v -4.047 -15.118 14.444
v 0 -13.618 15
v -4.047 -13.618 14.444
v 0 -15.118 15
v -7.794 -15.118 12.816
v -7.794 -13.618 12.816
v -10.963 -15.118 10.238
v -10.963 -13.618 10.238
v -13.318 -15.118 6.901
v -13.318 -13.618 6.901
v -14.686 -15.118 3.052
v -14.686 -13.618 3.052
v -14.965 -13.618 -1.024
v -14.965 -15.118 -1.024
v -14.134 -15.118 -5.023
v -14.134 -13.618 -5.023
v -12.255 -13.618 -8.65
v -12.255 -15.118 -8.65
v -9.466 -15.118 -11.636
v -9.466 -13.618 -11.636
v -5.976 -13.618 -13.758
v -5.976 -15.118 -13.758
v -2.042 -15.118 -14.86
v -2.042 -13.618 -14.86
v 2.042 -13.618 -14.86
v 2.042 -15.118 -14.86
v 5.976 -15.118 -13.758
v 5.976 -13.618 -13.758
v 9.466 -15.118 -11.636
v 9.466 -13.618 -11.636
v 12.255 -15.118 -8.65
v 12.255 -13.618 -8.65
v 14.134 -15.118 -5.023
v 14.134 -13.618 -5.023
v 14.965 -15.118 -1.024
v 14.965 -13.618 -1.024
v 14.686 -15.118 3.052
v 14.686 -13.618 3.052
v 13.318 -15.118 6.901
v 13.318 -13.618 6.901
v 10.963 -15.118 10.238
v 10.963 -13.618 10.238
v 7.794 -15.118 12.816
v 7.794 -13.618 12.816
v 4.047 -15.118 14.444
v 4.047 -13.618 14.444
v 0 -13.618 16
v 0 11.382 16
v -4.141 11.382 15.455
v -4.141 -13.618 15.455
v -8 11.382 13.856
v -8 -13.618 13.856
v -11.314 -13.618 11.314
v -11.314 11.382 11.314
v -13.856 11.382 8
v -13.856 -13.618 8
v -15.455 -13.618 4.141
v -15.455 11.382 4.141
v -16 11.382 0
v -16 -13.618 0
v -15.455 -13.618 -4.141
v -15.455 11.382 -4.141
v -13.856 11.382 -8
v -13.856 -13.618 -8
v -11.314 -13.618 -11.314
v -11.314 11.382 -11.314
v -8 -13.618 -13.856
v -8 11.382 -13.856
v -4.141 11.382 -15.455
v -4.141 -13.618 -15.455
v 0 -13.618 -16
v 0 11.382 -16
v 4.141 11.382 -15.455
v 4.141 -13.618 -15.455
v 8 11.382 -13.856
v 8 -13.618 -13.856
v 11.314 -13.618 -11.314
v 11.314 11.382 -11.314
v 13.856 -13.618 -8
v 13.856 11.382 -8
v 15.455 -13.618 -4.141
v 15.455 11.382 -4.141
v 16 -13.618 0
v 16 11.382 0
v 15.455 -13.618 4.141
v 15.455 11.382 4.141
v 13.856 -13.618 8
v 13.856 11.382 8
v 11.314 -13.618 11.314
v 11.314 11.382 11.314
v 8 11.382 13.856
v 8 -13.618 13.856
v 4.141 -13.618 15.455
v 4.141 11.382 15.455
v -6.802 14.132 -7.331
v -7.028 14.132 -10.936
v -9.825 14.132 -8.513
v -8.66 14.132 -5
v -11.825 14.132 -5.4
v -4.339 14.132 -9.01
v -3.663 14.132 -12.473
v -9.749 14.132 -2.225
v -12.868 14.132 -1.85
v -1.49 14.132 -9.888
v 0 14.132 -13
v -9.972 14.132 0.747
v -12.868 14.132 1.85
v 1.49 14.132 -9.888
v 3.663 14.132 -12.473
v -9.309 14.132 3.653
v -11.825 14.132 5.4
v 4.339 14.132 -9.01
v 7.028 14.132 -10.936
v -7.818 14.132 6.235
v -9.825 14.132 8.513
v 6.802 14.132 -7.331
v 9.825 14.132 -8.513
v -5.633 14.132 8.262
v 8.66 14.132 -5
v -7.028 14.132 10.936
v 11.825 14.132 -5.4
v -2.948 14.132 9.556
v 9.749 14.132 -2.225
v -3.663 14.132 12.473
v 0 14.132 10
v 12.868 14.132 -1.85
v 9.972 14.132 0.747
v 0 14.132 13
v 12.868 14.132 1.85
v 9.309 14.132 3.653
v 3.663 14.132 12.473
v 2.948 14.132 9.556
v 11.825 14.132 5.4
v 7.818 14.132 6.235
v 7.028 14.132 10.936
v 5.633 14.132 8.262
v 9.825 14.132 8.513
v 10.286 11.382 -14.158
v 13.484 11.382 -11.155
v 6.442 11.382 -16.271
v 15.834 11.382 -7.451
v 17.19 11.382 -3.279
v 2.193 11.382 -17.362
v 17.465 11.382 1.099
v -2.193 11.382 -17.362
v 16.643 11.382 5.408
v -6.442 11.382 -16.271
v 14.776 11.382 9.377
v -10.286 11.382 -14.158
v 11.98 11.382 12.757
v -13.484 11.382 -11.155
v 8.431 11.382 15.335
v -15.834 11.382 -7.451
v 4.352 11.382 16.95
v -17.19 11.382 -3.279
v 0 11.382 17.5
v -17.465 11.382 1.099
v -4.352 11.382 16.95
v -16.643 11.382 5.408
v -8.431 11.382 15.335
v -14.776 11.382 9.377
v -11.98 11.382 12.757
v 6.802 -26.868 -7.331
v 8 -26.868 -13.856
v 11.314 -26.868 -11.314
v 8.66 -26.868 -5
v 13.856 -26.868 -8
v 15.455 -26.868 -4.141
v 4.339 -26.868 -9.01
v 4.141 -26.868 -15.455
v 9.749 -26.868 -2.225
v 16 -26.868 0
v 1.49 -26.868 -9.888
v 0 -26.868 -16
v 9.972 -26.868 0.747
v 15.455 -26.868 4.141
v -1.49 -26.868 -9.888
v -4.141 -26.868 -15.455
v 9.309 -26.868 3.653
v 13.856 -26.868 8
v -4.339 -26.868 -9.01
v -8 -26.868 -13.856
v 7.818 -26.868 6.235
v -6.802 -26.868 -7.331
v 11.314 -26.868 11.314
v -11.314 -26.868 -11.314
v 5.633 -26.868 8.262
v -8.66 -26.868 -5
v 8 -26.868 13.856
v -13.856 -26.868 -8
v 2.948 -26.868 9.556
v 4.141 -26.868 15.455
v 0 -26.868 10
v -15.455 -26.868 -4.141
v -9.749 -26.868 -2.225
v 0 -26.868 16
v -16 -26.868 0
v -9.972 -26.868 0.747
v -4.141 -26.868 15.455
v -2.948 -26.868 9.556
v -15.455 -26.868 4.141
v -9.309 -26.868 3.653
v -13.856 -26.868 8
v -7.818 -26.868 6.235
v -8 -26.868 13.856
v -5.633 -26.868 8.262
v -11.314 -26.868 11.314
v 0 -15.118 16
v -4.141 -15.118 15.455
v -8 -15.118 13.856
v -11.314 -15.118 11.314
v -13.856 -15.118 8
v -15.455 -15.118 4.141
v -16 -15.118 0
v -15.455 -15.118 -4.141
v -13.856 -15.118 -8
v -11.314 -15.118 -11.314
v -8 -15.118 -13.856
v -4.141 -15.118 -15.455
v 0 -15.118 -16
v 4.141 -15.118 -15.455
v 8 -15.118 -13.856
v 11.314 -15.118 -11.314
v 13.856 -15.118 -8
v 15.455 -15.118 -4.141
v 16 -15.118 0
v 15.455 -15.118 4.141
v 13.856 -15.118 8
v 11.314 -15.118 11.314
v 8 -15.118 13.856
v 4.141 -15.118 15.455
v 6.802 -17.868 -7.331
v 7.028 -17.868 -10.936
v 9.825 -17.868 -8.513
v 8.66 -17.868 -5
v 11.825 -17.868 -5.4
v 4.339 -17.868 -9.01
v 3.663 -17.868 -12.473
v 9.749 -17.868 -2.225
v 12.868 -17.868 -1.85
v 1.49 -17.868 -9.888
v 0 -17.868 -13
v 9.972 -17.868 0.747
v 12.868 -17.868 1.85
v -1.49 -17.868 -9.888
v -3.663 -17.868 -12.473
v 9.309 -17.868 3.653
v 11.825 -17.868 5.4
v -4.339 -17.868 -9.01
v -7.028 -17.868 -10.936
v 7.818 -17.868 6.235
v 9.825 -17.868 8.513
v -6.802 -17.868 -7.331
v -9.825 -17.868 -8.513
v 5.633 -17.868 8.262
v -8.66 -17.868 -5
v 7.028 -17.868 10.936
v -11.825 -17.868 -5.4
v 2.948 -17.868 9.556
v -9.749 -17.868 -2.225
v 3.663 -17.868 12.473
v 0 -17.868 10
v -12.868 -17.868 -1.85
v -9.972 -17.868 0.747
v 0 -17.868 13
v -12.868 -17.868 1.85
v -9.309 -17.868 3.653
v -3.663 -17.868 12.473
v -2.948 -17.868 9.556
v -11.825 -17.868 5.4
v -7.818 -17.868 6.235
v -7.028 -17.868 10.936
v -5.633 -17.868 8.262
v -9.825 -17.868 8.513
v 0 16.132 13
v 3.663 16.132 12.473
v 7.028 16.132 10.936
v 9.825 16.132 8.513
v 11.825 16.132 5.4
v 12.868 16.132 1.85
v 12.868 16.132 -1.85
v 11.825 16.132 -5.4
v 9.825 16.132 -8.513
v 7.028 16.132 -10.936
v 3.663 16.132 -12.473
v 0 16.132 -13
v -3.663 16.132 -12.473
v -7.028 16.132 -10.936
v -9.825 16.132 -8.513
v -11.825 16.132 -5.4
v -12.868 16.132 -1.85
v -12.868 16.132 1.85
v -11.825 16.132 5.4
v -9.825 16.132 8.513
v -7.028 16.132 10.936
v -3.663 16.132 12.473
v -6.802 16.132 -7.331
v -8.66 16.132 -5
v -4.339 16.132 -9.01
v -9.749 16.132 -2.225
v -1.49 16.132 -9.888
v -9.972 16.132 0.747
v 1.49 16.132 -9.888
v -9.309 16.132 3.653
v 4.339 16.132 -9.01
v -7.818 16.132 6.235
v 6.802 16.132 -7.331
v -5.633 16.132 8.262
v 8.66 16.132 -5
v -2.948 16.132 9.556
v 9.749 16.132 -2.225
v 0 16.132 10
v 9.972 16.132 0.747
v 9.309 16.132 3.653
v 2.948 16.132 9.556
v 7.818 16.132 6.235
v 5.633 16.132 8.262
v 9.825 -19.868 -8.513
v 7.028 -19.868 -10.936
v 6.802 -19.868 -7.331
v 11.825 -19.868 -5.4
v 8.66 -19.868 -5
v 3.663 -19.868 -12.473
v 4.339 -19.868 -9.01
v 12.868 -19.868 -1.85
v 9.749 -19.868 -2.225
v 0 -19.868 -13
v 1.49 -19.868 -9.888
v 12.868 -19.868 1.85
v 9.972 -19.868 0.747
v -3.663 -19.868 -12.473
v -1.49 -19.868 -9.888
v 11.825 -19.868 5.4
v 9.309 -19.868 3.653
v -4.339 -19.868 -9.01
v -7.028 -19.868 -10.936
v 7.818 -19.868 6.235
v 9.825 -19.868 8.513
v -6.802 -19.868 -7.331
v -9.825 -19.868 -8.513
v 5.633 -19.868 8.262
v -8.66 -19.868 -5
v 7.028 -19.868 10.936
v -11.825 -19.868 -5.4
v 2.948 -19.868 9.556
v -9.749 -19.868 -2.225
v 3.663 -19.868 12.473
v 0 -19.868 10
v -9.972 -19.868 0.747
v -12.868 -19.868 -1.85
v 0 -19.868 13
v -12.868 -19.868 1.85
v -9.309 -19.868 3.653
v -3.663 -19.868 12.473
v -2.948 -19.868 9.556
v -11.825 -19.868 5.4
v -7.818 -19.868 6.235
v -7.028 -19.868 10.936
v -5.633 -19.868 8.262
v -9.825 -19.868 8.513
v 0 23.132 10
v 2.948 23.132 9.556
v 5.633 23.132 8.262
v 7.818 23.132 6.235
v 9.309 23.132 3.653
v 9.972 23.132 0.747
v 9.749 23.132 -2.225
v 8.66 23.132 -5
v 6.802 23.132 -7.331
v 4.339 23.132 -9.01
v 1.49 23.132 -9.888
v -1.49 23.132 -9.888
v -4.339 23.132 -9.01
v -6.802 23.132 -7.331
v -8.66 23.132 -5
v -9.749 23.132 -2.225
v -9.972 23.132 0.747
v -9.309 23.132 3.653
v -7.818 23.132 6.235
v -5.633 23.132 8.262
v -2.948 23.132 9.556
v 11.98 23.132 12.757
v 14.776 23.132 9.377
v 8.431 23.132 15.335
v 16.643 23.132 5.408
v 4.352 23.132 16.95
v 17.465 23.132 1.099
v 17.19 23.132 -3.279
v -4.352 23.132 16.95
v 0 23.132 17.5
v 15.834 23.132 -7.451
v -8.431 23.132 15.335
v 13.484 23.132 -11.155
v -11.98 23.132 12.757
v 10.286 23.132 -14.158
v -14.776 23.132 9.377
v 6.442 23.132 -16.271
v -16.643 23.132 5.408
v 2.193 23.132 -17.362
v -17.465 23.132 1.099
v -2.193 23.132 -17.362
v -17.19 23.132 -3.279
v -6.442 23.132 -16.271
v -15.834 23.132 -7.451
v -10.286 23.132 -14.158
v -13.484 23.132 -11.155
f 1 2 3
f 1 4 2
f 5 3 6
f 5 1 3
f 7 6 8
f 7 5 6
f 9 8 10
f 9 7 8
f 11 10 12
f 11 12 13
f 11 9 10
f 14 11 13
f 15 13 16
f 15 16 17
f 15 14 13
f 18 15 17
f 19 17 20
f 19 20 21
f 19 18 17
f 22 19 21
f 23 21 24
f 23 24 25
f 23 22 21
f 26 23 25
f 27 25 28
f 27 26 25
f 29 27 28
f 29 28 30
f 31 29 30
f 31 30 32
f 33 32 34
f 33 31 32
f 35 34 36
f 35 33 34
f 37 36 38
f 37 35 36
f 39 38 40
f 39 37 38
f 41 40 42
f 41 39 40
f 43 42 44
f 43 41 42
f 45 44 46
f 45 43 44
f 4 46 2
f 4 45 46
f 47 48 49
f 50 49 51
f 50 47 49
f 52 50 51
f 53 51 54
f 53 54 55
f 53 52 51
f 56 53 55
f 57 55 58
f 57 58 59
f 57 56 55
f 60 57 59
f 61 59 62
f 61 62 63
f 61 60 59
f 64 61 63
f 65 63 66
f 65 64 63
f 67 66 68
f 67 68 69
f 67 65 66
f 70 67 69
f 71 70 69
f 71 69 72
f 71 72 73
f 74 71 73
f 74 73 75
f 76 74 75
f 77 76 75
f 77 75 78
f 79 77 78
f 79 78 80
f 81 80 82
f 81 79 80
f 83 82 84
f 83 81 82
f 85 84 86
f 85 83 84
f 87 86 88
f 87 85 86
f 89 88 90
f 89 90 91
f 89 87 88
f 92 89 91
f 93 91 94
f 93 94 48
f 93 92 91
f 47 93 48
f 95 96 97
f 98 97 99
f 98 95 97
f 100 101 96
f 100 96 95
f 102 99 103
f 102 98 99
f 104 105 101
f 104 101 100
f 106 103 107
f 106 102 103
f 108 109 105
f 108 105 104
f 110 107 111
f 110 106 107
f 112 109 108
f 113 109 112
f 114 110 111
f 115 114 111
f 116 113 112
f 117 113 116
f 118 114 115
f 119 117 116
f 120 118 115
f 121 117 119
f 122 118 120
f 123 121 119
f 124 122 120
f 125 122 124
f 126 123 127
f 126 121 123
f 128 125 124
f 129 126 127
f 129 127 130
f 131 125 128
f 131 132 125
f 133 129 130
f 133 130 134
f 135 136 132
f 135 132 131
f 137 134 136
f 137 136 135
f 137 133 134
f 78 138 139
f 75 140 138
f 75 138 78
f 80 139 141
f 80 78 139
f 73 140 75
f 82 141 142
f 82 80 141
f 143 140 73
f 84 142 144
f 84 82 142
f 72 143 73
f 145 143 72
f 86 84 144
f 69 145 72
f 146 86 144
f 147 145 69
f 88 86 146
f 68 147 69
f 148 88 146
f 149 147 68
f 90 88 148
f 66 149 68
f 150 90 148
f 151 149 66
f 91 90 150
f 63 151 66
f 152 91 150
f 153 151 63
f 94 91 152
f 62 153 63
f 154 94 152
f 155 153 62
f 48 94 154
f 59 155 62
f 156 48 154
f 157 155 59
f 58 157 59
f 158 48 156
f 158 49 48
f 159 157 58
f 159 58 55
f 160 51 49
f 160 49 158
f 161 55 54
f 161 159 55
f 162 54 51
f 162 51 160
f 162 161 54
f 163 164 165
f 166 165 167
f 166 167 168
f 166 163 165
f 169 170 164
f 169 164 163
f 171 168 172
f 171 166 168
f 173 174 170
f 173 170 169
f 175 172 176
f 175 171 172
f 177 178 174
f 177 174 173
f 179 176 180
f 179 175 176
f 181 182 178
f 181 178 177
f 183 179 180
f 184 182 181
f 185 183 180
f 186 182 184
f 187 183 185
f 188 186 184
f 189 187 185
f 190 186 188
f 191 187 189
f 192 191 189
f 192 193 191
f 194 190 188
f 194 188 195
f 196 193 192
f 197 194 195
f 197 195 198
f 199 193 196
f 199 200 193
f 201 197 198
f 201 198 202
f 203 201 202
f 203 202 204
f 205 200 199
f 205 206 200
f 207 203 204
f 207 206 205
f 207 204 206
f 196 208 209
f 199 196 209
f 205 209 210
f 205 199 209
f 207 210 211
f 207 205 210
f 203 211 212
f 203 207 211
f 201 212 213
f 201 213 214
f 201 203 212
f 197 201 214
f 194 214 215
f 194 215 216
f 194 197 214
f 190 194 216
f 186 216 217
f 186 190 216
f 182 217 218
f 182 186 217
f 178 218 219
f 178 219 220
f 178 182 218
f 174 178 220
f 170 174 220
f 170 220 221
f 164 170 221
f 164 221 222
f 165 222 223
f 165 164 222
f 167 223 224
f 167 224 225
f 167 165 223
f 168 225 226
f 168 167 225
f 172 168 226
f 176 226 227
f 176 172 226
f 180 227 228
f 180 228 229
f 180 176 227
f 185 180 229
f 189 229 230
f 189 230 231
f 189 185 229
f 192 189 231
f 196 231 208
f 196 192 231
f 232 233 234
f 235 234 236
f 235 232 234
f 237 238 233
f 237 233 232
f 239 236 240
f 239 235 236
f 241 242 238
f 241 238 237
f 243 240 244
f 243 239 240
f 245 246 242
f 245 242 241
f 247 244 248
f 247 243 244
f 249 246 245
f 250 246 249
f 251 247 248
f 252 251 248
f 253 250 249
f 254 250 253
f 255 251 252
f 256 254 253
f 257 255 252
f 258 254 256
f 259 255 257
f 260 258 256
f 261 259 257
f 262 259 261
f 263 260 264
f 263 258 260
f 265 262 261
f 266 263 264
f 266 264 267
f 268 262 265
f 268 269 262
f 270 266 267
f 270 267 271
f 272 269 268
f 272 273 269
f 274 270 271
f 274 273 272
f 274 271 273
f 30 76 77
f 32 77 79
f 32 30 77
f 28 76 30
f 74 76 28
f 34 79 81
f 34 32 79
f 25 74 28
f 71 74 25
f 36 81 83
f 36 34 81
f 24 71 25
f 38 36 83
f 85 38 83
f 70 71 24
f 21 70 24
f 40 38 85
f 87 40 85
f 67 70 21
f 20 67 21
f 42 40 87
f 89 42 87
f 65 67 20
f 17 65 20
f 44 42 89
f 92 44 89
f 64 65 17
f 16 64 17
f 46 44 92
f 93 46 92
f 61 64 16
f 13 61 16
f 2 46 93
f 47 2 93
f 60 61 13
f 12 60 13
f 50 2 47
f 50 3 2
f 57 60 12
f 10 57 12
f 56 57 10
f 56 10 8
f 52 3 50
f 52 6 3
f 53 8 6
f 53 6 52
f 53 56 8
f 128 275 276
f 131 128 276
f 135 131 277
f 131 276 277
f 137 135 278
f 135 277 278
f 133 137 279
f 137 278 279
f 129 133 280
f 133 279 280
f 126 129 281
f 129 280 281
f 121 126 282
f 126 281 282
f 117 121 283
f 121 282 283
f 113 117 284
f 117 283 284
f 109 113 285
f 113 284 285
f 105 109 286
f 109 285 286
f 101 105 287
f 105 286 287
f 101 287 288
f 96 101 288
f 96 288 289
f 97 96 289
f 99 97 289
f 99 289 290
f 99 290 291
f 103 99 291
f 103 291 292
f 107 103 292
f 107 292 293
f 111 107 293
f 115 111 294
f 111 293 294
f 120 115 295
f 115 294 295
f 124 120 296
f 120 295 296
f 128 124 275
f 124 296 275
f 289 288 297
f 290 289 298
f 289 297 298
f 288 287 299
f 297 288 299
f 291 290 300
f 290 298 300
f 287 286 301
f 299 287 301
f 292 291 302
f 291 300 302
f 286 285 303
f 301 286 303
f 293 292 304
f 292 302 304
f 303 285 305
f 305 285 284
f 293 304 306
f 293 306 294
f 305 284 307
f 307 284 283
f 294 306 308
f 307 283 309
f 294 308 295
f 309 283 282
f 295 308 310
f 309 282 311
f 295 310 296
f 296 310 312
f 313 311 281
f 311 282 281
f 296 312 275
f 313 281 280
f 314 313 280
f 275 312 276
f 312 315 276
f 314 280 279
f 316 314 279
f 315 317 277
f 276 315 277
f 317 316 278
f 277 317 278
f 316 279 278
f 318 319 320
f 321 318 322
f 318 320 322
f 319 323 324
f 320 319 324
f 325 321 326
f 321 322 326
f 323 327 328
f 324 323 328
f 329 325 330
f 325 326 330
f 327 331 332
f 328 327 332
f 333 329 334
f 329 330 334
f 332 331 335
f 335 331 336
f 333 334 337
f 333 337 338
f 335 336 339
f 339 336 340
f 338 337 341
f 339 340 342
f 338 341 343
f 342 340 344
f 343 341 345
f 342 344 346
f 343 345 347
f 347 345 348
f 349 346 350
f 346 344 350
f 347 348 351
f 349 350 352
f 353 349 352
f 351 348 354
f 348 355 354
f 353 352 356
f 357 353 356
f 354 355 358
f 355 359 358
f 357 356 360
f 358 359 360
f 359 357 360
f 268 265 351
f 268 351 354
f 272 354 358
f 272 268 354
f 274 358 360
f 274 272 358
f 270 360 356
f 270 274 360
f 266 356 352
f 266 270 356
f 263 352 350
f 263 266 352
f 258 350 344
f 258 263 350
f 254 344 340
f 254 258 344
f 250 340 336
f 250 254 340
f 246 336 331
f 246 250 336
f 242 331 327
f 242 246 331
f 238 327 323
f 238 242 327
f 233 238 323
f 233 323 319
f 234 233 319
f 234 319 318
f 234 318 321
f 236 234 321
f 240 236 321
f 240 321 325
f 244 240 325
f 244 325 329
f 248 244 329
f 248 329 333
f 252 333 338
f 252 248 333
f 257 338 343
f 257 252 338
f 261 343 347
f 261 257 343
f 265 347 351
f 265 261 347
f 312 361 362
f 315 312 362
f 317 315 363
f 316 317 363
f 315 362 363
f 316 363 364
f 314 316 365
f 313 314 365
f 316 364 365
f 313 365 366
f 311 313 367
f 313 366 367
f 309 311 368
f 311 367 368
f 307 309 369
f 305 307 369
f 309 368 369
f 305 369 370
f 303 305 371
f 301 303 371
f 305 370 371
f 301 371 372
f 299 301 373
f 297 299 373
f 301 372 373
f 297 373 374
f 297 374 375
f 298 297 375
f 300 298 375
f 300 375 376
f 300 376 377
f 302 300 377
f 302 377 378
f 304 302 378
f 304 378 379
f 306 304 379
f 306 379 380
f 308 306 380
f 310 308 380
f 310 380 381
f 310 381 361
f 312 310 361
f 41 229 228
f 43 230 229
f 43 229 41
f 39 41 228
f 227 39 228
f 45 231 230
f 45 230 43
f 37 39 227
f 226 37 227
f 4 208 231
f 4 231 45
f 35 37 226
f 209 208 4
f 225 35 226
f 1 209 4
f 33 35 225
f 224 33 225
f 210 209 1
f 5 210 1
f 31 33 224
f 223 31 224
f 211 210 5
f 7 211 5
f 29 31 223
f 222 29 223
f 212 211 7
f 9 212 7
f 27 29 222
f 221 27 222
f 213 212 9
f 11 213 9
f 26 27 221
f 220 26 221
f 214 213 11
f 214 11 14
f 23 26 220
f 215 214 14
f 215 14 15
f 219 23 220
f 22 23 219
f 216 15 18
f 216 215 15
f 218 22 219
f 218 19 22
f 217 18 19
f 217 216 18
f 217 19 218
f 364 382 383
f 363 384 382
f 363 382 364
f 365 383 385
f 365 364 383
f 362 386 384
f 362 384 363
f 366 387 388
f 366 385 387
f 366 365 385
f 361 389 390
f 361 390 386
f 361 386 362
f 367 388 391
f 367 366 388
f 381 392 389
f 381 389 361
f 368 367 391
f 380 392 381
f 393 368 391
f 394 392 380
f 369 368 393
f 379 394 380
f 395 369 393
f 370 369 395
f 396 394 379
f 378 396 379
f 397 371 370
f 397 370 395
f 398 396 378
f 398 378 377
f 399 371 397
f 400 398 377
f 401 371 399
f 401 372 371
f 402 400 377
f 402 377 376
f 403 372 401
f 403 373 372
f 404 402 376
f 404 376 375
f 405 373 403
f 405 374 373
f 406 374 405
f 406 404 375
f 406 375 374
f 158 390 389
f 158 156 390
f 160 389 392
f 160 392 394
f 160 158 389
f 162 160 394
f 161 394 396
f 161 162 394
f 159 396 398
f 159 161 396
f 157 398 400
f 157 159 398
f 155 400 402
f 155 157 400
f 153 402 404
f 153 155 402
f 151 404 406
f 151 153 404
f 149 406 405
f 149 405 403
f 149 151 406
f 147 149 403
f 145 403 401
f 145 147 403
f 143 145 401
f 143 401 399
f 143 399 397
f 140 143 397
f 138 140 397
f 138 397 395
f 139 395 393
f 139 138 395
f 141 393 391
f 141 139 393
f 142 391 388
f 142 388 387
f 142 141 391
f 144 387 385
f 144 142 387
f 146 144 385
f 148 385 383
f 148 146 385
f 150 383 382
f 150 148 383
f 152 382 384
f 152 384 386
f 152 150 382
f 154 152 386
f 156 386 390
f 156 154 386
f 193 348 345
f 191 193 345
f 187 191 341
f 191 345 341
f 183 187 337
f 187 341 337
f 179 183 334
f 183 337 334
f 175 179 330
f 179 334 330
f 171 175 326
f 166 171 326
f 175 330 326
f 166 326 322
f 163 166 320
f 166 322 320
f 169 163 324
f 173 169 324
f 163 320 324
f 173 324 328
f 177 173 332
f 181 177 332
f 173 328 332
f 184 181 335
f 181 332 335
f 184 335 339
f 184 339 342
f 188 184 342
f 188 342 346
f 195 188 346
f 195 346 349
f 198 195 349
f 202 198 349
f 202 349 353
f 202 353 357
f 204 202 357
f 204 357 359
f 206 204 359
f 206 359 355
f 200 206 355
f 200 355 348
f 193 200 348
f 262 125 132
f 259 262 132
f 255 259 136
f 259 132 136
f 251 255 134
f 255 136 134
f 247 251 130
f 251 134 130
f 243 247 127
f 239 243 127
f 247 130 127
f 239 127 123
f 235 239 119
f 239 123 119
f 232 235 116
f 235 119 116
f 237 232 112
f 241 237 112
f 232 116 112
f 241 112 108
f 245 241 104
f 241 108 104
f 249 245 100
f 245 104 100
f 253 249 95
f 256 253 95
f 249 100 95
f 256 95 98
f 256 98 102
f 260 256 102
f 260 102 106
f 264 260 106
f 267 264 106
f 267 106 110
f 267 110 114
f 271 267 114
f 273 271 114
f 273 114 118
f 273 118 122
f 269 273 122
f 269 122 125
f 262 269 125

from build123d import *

# Parameters (mm, degrees)
SKETCH2_R          = 10
CUT_EXTRUDE1_DEPTH = 56.789784011
SKETCH3_R          = 13
CUT_EXTRUDE2_DEPTH = 2
CUT_EXTRUDE3_START = -2
SKETCH4_R          = 13
CUT_EXTRUDE3_DEPTH = 2


with BuildPart() as part:
    # Sketch1 → Revolve1 (revolve)
    with BuildSketch(Plane.XY, mode=Mode.PRIVATE) as revolve1_sk:
        Polygon((0, 23.132117765), (17.5, 23.132117765), (17.5, 11.382117765), (16, 11.382117765), (16, -13.617882235), (15, -13.617882235), (15, -15.117882235), (16, -15.117882235), (16, -26.867882235), (0, -26.867882235), align=None)
    revolve(revolve1_sk.sketch.rotate(Axis((0, 23.362720403, 0), (0, -1, 0)), 90), axis=Axis((0, 23.362720403, 0), (0, -1, 0)))

    # Sketch2 → Cut-Extrude1 (cut, through all)
    with BuildSketch(Plane(origin=(0, 23.132117765, 0), x_dir=(1, 0, 0), z_dir=(0, 1, 0))):
        with Locations(Location((0, 0, 0), (0, 0, 270))):
            Circle(SKETCH2_R)
    extrude(amount=-CUT_EXTRUDE1_DEPTH, mode=Mode.SUBTRACT)

    # Sketch3 → Cut-Extrude2 (cut)
    with BuildSketch(Plane(origin=(0, 16.132117765, 0), x_dir=(1, 0, 0), z_dir=(0, 1, 0))):
        with Locations(Location((0, 0, 0), (0, 0, 270))):
            Circle(SKETCH3_R)
    extrude(amount=-CUT_EXTRUDE2_DEPTH, mode=Mode.SUBTRACT)

    # Sketch4 → Cut-Extrude3 (cut)
    with BuildSketch(Plane(origin=(0, -19.867882235, 0), x_dir=(-1, 0, 0), z_dir=(0, -1, 0)).offset(CUT_EXTRUDE3_START)):
        with Locations(Location((0, 0, 0), (0, 0, 270))):
            Circle(SKETCH4_R)
    extrude(amount=CUT_EXTRUDE3_DEPTH, mode=Mode.SUBTRACT)


solid = part.part
